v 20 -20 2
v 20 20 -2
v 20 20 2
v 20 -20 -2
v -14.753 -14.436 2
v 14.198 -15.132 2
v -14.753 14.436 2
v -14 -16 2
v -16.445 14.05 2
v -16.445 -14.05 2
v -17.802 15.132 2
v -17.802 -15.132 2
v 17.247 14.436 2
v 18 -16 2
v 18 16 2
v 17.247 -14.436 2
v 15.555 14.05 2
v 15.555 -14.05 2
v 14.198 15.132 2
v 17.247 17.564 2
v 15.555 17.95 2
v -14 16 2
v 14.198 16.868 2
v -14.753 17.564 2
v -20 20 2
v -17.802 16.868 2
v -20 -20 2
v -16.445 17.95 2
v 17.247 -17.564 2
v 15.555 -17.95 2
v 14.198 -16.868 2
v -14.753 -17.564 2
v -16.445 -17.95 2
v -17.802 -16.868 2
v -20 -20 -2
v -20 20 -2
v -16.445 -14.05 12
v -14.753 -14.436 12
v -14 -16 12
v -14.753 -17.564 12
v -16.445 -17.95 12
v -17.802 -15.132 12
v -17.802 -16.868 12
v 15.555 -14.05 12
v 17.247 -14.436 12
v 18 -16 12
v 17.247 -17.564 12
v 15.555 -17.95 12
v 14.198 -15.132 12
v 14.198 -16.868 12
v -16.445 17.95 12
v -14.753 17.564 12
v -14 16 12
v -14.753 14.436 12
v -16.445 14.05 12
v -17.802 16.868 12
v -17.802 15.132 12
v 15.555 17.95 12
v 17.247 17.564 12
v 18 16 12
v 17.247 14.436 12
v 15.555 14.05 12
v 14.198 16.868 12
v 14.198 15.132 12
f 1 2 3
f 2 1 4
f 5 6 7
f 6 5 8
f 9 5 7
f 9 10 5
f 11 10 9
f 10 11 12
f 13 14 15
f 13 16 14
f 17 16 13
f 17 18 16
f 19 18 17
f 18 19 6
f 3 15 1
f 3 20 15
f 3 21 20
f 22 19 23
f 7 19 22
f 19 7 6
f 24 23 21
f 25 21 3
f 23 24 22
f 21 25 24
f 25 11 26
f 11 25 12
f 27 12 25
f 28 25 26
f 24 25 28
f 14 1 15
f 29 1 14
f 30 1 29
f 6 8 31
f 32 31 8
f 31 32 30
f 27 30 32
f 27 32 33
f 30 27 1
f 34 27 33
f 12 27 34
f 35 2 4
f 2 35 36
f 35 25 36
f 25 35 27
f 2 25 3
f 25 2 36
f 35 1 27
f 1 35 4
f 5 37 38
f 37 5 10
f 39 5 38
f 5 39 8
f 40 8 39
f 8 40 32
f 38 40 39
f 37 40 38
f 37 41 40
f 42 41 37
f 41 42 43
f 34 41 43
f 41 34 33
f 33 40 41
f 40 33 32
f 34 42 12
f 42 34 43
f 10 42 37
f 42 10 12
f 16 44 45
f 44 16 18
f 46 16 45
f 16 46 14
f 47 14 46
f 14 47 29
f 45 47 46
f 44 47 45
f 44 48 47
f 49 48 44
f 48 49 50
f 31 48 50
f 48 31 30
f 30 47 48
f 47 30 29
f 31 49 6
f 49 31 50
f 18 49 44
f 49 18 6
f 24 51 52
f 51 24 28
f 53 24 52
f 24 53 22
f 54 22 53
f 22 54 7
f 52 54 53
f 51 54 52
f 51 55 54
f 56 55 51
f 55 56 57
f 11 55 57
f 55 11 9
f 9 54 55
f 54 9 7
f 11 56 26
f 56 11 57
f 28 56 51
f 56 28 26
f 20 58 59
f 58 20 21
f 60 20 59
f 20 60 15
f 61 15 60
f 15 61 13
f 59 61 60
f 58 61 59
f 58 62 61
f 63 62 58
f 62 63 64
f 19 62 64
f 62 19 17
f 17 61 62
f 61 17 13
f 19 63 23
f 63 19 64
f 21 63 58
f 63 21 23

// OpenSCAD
cube([40,40,4], center=true);
translate([-16,-16,0]) cylinder(h=12, r=2);
translate([16,-16,0]) cylinder(h=12, r=2);
translate([-16,16,0]) cylinder(h=12, r=2);
translate([16,16,0]) cylinder(h=12, r=2);
